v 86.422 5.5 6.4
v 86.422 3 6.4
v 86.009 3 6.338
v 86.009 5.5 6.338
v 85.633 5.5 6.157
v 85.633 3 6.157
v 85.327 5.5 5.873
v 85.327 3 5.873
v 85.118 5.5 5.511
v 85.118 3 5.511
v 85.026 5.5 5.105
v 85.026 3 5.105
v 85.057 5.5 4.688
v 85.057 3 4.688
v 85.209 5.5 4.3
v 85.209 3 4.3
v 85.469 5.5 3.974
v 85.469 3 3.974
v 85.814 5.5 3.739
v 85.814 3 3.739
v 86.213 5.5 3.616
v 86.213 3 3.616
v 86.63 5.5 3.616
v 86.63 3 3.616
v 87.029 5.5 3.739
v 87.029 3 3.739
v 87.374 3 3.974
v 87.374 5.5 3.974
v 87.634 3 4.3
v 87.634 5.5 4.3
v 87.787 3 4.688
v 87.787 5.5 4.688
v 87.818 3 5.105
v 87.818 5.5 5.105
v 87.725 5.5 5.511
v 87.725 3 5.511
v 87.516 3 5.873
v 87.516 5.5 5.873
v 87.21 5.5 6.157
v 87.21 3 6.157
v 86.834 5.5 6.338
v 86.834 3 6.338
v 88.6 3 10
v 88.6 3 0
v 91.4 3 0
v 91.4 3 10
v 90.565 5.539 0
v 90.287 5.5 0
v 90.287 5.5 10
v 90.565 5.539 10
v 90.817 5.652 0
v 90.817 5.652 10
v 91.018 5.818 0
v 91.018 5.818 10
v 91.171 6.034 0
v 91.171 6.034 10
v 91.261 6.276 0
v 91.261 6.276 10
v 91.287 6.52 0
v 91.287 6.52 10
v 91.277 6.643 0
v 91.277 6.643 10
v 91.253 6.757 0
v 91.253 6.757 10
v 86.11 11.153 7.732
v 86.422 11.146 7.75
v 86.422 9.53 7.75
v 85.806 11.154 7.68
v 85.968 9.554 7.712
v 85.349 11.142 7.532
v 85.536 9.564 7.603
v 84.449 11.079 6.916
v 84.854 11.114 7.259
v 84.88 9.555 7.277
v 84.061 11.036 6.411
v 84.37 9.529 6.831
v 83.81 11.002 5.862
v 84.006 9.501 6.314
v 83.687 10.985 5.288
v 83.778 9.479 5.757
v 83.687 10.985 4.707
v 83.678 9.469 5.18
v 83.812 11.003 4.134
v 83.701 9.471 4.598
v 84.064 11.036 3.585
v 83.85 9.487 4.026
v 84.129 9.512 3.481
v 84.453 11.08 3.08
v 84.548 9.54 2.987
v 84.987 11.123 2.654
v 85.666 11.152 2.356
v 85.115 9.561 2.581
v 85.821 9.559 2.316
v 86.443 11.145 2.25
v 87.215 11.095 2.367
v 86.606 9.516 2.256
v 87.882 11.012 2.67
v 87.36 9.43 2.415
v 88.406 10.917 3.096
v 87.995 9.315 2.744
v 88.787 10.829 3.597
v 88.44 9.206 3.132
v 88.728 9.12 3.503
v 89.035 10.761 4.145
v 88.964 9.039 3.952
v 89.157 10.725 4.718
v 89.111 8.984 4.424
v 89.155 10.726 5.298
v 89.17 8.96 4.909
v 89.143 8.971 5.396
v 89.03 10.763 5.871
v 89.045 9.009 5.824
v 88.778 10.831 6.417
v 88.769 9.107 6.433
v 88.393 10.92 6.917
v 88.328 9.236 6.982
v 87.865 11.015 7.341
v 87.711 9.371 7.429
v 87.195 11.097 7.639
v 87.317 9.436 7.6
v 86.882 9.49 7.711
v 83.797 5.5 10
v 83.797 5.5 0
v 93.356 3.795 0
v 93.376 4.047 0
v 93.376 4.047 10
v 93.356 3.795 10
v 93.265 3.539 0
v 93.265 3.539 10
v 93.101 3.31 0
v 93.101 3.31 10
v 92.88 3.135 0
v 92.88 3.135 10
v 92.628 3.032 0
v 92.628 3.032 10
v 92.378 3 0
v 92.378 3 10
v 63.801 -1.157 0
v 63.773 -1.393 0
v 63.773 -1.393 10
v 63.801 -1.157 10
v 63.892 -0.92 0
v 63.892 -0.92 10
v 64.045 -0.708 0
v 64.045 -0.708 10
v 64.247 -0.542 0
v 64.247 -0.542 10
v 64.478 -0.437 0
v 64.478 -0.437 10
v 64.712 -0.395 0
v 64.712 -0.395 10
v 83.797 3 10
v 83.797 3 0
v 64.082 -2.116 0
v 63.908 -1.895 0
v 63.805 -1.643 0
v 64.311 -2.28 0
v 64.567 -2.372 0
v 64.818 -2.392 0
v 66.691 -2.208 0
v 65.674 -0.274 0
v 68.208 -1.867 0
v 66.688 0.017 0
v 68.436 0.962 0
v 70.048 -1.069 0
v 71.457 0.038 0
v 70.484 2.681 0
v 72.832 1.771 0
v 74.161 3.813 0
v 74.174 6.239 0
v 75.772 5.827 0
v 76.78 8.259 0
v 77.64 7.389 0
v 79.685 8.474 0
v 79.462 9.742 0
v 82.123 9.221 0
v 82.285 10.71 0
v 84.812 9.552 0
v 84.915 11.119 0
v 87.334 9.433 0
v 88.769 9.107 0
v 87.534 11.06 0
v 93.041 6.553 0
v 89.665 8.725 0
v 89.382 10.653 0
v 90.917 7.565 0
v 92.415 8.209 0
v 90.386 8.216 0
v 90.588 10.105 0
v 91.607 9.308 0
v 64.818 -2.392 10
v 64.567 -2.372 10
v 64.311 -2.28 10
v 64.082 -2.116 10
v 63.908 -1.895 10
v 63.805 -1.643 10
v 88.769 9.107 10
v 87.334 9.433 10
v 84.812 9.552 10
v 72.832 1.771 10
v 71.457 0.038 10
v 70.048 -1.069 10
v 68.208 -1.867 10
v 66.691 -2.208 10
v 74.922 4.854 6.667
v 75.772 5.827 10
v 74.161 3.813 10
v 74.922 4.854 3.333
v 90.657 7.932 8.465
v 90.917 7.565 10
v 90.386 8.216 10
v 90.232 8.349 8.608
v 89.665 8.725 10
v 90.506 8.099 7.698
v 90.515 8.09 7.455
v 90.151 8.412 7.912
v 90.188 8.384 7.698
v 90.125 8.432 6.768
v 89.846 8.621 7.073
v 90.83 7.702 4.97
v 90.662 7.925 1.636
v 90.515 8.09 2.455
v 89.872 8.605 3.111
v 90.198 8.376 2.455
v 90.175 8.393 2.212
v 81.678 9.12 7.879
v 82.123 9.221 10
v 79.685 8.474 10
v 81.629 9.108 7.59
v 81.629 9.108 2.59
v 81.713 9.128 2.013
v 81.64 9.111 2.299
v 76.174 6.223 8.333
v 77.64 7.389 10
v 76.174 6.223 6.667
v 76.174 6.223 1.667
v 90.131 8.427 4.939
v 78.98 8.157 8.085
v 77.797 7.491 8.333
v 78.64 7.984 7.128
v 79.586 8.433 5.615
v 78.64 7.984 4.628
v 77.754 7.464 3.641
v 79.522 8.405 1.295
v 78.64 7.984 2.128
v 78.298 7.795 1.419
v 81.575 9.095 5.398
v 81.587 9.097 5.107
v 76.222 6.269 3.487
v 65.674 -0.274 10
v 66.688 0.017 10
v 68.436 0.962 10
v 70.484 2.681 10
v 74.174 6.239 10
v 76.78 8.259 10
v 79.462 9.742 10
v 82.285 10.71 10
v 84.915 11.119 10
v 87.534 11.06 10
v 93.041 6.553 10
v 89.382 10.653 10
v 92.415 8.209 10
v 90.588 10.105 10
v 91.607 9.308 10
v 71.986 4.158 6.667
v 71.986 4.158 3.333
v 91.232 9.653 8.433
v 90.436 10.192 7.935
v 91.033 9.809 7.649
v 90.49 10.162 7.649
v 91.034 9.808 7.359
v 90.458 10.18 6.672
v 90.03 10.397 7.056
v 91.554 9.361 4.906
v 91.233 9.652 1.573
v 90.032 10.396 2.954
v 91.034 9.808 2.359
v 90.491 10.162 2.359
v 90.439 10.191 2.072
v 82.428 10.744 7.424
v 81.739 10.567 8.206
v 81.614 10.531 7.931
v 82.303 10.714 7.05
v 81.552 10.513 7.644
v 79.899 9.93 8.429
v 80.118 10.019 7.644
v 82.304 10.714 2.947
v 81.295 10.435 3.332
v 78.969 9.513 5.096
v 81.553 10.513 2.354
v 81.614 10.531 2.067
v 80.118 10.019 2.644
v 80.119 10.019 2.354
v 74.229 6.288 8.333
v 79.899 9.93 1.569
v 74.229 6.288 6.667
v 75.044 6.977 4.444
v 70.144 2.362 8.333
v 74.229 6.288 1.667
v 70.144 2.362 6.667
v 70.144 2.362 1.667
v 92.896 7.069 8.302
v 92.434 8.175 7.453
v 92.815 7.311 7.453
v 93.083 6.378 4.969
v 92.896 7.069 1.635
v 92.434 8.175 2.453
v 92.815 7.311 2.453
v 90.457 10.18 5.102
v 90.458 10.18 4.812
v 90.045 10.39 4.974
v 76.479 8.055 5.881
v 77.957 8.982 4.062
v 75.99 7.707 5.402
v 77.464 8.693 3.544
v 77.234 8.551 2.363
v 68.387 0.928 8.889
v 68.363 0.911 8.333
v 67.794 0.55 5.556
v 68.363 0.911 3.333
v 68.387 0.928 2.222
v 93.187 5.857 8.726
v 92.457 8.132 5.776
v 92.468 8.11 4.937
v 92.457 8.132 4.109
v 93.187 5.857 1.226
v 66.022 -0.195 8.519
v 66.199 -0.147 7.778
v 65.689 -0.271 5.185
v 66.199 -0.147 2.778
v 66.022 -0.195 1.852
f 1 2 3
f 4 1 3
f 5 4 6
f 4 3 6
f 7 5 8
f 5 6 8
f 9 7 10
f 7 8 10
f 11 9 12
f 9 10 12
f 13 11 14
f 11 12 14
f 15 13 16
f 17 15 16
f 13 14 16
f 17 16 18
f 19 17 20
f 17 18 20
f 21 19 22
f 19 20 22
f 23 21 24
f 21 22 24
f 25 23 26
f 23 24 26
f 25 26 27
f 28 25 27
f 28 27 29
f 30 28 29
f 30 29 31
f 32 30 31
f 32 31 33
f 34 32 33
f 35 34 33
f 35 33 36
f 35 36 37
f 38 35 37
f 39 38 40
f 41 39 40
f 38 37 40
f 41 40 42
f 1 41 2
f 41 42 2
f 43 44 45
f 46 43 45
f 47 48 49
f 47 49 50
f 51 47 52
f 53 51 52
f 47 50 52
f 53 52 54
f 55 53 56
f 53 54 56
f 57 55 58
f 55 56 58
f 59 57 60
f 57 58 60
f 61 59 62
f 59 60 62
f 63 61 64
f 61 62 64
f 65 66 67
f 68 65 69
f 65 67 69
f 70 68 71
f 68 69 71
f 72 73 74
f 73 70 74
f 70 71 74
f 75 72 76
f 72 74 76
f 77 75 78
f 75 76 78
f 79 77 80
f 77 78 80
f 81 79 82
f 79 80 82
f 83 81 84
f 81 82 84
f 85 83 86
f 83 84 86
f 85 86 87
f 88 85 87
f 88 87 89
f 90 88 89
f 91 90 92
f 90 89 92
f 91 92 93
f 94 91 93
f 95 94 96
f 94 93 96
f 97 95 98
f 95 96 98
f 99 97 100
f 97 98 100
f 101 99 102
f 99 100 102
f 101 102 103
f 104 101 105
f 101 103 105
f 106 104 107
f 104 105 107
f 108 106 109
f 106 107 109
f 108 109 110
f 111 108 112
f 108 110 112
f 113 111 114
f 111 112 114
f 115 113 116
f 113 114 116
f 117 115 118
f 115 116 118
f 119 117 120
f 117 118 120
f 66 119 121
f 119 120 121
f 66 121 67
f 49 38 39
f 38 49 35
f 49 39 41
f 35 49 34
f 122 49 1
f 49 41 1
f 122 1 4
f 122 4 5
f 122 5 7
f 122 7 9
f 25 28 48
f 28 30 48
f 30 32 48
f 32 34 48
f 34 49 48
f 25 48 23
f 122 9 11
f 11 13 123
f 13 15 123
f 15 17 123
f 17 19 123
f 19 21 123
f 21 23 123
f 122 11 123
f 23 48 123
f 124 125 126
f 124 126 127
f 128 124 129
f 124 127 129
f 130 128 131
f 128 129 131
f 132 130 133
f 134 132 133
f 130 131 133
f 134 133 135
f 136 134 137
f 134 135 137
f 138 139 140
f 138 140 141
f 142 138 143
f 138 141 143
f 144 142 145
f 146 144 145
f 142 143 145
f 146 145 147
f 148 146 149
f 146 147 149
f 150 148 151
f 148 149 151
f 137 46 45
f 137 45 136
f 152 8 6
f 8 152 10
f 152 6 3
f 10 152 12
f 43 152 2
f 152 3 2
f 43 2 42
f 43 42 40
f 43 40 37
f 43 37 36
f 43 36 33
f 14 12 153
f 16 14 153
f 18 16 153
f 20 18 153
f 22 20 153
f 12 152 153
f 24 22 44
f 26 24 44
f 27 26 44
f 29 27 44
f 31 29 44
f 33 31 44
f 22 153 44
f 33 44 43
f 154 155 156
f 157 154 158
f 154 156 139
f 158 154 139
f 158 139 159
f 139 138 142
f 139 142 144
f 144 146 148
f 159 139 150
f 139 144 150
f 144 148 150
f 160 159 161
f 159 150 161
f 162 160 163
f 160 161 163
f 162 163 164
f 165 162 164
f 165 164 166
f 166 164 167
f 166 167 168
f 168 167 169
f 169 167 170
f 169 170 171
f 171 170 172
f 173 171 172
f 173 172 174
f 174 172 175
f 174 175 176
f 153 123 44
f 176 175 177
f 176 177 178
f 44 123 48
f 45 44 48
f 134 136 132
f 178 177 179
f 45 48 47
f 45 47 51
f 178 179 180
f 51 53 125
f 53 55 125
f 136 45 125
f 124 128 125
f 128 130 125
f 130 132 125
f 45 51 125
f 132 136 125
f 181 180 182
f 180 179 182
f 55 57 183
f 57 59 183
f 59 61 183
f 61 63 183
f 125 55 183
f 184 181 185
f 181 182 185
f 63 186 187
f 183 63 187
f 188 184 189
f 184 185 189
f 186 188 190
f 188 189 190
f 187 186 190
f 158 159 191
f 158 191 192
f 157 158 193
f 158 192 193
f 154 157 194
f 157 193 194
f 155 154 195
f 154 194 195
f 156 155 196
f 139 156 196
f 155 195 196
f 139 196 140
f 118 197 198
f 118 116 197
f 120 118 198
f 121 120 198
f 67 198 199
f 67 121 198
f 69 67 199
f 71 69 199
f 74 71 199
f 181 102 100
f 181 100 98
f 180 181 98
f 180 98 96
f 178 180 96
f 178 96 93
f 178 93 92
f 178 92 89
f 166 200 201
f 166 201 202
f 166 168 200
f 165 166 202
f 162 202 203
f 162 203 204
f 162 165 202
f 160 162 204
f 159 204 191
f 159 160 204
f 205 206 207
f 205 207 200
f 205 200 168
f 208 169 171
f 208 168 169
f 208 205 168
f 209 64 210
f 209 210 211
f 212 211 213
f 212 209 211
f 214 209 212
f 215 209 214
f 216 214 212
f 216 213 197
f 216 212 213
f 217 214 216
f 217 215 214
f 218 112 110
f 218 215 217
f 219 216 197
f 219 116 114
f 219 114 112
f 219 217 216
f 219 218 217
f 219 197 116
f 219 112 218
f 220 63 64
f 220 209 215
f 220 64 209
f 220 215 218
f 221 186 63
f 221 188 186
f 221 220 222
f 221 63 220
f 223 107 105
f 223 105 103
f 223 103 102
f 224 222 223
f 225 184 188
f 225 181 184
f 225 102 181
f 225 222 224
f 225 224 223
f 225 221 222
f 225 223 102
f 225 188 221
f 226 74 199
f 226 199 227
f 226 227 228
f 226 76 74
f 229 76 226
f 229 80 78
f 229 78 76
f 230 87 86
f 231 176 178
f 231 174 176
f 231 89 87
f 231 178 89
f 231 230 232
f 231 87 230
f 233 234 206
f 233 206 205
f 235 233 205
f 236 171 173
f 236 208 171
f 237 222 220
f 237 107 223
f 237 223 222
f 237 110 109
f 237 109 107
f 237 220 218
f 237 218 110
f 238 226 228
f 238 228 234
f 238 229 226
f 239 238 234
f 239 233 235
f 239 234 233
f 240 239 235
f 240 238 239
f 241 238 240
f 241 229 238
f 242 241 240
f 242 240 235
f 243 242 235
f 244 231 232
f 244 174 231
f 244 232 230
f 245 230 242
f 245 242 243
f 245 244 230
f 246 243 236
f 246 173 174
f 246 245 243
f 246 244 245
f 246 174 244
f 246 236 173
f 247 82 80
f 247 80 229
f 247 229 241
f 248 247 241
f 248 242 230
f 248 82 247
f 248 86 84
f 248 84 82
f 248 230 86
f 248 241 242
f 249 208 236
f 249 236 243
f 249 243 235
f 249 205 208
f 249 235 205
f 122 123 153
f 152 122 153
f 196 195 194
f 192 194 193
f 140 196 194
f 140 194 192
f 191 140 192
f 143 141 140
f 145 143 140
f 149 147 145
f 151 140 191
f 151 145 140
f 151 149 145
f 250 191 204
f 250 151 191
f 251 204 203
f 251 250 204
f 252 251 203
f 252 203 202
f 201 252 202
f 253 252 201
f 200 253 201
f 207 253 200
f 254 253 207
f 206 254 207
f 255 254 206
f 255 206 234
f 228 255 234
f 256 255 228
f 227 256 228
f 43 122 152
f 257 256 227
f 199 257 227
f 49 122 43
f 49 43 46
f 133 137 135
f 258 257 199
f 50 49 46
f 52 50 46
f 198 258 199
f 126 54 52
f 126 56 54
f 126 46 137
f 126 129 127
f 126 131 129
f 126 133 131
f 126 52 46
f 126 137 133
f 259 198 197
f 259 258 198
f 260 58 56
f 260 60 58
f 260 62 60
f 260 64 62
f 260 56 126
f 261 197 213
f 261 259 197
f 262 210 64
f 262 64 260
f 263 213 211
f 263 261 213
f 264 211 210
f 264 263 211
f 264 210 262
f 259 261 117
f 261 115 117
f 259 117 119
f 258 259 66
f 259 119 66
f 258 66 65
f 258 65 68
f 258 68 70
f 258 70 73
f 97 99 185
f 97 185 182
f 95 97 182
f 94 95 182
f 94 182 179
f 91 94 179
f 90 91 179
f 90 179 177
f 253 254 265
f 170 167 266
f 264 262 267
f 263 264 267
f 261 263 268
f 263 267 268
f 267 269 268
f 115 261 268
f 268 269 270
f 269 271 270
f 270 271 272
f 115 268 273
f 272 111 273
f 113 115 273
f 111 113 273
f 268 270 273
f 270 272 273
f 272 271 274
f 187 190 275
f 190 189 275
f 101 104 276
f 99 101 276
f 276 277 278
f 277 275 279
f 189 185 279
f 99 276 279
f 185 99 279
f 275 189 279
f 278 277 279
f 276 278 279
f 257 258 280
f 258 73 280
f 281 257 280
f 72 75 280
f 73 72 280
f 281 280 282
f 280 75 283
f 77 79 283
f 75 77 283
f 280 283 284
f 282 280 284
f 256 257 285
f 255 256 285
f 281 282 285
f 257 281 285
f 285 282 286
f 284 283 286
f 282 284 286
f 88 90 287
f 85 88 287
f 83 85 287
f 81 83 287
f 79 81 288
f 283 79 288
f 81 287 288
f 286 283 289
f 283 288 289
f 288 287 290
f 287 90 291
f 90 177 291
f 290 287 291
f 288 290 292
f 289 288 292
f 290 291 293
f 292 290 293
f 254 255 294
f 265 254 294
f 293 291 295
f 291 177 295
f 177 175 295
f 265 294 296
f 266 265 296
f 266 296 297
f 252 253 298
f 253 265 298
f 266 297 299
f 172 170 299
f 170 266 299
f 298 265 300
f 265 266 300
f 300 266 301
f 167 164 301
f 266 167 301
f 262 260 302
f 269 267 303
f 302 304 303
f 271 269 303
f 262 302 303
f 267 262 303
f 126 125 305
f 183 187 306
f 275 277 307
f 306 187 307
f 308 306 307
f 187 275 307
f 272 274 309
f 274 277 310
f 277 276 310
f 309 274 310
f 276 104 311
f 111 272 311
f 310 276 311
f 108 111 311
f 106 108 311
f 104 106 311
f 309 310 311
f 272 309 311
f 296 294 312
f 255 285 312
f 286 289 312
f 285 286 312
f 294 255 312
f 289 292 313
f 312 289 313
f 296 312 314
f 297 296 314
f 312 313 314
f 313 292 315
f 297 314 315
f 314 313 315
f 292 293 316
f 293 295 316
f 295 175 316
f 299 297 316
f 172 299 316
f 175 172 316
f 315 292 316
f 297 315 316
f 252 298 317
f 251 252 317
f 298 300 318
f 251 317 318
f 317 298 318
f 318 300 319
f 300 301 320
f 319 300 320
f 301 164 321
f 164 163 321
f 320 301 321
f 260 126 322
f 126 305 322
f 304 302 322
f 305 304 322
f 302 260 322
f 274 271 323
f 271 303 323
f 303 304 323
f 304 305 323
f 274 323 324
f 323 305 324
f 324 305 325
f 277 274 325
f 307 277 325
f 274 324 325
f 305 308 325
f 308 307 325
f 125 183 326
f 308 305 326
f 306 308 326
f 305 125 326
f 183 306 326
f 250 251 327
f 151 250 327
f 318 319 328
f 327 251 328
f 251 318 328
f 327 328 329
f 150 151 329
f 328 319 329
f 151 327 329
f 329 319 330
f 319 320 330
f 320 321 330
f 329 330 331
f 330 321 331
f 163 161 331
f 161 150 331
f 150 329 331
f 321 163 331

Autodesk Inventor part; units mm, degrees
ref_plane "YZ Plane" through (0, 0, 0) normal (1, 0, 0) x (0, 1, 0)
ref_plane "XZ Plane" through (0, 0, 0) normal (0, 1, 0) x (-1, 0, 0)
ref_plane "XY Plane" through (0, 0, 0) normal (0, 0, 1) x (1, 0, 0)
ref_plane "Arbeitsebene1" through (0, 0, 0) normal (0, 0, 1) x (1, 0, 0)
sketch "Skizze1" plane through (0, 0, 0) normal (0, 0, 1) x (1, 0, 0)
  line L0 (78, 3) -> (108.3, 3) projected
  line L1 (77, -2.3955) -> (1, -2.3955) projected
  line L2 (88.6, 3) -> (91.4, 3) projected
  line L3 (91.4, 3) -> (91.4, 0)
  line L4 (88.6, 3) -> (88.6, 0)
  line L5 (83.7973, 3) -> (93.4, 3)
  line L6 (93.4, 3) -> (93.4, 8.7752) construction
  line L7 (93.4, 8.7752) -> (89.9261, 12.2491) construction
  line L8 (89.9261, 12.2491) -> (75.4775, 12.2491) construction
  line L9 (75.4775, 12.2491) -> (69.5721, -0.415) construction
  line L10 (69.5721, -0.415) -> (65.4051, -0.415) construction
  line L11 (65.4051, -0.415) -> (63.7727, -0.415) construction
  spline S0 degree 4 poles (93.4, 3) (93.4, 8.7752) (89.9261, 12.2491) (75.4775, 12.2491) (69.5721, -0.415) (65.4051, -0.415) (63.7727, -0.415) knots 1 1 1 1 1 2 3 4 4 4 4 4
  line L12 (91.4, 5.5) -> (91.4, 7.9468) construction
  line L13 (91.4, 7.9468) -> (89.0977, 10.2491) construction
  line L14 (89.0977, 10.2491) -> (76.7516, 10.2491) construction
  line L15 (76.7516, 10.2491) -> (73.2926, 2.8311) construction
  line L16 (73.2926, 2.8311) -> (70.8463, -2.415) construction
  line L17 (70.8463, -2.415) -> (63.7727, -2.415) construction
  spline S1 degree 4 poles (91.4, 5.5) (91.4, 7.9468) (89.0977, 10.2491) (76.7516, 10.2491) (73.2926, 2.8311) (70.8463, -2.415) (63.7727, -2.415) knots 1 1 1 1 1 2 3 4 4 4 4 4
  line L18 (91.4, 5.5) -> (83.7973, 5.5)
  line L19 (83.7973, 5.5) -> (83.7973, 3)
  line L20 (63.7727, -2.415) -> (63.7727, -0.415)
  point P0 (0, 0)
  point P1 (63.7727, -2.3955)
  point P2 (64.7379, -2.3955)
  dimension "d0" = 2
  dimension "d1" = 2
  dimension "d2" = 2
  dimension "d3" = 2
  dimension "d4" = 2
  dimension "d5" = 45
  dimension "d6" = 65
  dimension "d7" = 2.5
extrude "Extrusion1" add sketch "Skizze1" along normal blind 10 contours L19 L18 S1 L1 L20 S0 L0
ref_plane "Arbeitsebene2" through (83.7973, 11.75, 0) normal (0, 1, 0) x (1, 0, 0)
sketch "Skizze2" plane through (83.7973, 11.75, 0) normal (0, 1, 0) x (1, 0, 0)
  line L0 (7.6027, 0) -> (0, 0) projected
  line L1 (0, 0) -> (0, -10) projected
  line L2 (7.6027, -10) -> (0, -10) projected
  line L3 (7.6027, 0) -> (7.6027, -10) projected
  circle A0 centre (2.6244, -5) radius 1
  point P0 (-83.7973, 0)
  dimension "d11" = 2
hole "Bohrung1" at (86.4217, 11.75, 5) direction (0, -1, 0) diameter 2.8 end through all counterbore diameter 5.5 counterbore depth 5
fillet "Rundung1" radius 1 4 edges at (91.4, 5.5, 5) (63.7727, -0.415, 5) (63.7727, -2.3955, 5) (93.4, 3, 5)
properties part number "30_XYTabel_Aliexpress_cellSTORM_chiptray_clamp"
